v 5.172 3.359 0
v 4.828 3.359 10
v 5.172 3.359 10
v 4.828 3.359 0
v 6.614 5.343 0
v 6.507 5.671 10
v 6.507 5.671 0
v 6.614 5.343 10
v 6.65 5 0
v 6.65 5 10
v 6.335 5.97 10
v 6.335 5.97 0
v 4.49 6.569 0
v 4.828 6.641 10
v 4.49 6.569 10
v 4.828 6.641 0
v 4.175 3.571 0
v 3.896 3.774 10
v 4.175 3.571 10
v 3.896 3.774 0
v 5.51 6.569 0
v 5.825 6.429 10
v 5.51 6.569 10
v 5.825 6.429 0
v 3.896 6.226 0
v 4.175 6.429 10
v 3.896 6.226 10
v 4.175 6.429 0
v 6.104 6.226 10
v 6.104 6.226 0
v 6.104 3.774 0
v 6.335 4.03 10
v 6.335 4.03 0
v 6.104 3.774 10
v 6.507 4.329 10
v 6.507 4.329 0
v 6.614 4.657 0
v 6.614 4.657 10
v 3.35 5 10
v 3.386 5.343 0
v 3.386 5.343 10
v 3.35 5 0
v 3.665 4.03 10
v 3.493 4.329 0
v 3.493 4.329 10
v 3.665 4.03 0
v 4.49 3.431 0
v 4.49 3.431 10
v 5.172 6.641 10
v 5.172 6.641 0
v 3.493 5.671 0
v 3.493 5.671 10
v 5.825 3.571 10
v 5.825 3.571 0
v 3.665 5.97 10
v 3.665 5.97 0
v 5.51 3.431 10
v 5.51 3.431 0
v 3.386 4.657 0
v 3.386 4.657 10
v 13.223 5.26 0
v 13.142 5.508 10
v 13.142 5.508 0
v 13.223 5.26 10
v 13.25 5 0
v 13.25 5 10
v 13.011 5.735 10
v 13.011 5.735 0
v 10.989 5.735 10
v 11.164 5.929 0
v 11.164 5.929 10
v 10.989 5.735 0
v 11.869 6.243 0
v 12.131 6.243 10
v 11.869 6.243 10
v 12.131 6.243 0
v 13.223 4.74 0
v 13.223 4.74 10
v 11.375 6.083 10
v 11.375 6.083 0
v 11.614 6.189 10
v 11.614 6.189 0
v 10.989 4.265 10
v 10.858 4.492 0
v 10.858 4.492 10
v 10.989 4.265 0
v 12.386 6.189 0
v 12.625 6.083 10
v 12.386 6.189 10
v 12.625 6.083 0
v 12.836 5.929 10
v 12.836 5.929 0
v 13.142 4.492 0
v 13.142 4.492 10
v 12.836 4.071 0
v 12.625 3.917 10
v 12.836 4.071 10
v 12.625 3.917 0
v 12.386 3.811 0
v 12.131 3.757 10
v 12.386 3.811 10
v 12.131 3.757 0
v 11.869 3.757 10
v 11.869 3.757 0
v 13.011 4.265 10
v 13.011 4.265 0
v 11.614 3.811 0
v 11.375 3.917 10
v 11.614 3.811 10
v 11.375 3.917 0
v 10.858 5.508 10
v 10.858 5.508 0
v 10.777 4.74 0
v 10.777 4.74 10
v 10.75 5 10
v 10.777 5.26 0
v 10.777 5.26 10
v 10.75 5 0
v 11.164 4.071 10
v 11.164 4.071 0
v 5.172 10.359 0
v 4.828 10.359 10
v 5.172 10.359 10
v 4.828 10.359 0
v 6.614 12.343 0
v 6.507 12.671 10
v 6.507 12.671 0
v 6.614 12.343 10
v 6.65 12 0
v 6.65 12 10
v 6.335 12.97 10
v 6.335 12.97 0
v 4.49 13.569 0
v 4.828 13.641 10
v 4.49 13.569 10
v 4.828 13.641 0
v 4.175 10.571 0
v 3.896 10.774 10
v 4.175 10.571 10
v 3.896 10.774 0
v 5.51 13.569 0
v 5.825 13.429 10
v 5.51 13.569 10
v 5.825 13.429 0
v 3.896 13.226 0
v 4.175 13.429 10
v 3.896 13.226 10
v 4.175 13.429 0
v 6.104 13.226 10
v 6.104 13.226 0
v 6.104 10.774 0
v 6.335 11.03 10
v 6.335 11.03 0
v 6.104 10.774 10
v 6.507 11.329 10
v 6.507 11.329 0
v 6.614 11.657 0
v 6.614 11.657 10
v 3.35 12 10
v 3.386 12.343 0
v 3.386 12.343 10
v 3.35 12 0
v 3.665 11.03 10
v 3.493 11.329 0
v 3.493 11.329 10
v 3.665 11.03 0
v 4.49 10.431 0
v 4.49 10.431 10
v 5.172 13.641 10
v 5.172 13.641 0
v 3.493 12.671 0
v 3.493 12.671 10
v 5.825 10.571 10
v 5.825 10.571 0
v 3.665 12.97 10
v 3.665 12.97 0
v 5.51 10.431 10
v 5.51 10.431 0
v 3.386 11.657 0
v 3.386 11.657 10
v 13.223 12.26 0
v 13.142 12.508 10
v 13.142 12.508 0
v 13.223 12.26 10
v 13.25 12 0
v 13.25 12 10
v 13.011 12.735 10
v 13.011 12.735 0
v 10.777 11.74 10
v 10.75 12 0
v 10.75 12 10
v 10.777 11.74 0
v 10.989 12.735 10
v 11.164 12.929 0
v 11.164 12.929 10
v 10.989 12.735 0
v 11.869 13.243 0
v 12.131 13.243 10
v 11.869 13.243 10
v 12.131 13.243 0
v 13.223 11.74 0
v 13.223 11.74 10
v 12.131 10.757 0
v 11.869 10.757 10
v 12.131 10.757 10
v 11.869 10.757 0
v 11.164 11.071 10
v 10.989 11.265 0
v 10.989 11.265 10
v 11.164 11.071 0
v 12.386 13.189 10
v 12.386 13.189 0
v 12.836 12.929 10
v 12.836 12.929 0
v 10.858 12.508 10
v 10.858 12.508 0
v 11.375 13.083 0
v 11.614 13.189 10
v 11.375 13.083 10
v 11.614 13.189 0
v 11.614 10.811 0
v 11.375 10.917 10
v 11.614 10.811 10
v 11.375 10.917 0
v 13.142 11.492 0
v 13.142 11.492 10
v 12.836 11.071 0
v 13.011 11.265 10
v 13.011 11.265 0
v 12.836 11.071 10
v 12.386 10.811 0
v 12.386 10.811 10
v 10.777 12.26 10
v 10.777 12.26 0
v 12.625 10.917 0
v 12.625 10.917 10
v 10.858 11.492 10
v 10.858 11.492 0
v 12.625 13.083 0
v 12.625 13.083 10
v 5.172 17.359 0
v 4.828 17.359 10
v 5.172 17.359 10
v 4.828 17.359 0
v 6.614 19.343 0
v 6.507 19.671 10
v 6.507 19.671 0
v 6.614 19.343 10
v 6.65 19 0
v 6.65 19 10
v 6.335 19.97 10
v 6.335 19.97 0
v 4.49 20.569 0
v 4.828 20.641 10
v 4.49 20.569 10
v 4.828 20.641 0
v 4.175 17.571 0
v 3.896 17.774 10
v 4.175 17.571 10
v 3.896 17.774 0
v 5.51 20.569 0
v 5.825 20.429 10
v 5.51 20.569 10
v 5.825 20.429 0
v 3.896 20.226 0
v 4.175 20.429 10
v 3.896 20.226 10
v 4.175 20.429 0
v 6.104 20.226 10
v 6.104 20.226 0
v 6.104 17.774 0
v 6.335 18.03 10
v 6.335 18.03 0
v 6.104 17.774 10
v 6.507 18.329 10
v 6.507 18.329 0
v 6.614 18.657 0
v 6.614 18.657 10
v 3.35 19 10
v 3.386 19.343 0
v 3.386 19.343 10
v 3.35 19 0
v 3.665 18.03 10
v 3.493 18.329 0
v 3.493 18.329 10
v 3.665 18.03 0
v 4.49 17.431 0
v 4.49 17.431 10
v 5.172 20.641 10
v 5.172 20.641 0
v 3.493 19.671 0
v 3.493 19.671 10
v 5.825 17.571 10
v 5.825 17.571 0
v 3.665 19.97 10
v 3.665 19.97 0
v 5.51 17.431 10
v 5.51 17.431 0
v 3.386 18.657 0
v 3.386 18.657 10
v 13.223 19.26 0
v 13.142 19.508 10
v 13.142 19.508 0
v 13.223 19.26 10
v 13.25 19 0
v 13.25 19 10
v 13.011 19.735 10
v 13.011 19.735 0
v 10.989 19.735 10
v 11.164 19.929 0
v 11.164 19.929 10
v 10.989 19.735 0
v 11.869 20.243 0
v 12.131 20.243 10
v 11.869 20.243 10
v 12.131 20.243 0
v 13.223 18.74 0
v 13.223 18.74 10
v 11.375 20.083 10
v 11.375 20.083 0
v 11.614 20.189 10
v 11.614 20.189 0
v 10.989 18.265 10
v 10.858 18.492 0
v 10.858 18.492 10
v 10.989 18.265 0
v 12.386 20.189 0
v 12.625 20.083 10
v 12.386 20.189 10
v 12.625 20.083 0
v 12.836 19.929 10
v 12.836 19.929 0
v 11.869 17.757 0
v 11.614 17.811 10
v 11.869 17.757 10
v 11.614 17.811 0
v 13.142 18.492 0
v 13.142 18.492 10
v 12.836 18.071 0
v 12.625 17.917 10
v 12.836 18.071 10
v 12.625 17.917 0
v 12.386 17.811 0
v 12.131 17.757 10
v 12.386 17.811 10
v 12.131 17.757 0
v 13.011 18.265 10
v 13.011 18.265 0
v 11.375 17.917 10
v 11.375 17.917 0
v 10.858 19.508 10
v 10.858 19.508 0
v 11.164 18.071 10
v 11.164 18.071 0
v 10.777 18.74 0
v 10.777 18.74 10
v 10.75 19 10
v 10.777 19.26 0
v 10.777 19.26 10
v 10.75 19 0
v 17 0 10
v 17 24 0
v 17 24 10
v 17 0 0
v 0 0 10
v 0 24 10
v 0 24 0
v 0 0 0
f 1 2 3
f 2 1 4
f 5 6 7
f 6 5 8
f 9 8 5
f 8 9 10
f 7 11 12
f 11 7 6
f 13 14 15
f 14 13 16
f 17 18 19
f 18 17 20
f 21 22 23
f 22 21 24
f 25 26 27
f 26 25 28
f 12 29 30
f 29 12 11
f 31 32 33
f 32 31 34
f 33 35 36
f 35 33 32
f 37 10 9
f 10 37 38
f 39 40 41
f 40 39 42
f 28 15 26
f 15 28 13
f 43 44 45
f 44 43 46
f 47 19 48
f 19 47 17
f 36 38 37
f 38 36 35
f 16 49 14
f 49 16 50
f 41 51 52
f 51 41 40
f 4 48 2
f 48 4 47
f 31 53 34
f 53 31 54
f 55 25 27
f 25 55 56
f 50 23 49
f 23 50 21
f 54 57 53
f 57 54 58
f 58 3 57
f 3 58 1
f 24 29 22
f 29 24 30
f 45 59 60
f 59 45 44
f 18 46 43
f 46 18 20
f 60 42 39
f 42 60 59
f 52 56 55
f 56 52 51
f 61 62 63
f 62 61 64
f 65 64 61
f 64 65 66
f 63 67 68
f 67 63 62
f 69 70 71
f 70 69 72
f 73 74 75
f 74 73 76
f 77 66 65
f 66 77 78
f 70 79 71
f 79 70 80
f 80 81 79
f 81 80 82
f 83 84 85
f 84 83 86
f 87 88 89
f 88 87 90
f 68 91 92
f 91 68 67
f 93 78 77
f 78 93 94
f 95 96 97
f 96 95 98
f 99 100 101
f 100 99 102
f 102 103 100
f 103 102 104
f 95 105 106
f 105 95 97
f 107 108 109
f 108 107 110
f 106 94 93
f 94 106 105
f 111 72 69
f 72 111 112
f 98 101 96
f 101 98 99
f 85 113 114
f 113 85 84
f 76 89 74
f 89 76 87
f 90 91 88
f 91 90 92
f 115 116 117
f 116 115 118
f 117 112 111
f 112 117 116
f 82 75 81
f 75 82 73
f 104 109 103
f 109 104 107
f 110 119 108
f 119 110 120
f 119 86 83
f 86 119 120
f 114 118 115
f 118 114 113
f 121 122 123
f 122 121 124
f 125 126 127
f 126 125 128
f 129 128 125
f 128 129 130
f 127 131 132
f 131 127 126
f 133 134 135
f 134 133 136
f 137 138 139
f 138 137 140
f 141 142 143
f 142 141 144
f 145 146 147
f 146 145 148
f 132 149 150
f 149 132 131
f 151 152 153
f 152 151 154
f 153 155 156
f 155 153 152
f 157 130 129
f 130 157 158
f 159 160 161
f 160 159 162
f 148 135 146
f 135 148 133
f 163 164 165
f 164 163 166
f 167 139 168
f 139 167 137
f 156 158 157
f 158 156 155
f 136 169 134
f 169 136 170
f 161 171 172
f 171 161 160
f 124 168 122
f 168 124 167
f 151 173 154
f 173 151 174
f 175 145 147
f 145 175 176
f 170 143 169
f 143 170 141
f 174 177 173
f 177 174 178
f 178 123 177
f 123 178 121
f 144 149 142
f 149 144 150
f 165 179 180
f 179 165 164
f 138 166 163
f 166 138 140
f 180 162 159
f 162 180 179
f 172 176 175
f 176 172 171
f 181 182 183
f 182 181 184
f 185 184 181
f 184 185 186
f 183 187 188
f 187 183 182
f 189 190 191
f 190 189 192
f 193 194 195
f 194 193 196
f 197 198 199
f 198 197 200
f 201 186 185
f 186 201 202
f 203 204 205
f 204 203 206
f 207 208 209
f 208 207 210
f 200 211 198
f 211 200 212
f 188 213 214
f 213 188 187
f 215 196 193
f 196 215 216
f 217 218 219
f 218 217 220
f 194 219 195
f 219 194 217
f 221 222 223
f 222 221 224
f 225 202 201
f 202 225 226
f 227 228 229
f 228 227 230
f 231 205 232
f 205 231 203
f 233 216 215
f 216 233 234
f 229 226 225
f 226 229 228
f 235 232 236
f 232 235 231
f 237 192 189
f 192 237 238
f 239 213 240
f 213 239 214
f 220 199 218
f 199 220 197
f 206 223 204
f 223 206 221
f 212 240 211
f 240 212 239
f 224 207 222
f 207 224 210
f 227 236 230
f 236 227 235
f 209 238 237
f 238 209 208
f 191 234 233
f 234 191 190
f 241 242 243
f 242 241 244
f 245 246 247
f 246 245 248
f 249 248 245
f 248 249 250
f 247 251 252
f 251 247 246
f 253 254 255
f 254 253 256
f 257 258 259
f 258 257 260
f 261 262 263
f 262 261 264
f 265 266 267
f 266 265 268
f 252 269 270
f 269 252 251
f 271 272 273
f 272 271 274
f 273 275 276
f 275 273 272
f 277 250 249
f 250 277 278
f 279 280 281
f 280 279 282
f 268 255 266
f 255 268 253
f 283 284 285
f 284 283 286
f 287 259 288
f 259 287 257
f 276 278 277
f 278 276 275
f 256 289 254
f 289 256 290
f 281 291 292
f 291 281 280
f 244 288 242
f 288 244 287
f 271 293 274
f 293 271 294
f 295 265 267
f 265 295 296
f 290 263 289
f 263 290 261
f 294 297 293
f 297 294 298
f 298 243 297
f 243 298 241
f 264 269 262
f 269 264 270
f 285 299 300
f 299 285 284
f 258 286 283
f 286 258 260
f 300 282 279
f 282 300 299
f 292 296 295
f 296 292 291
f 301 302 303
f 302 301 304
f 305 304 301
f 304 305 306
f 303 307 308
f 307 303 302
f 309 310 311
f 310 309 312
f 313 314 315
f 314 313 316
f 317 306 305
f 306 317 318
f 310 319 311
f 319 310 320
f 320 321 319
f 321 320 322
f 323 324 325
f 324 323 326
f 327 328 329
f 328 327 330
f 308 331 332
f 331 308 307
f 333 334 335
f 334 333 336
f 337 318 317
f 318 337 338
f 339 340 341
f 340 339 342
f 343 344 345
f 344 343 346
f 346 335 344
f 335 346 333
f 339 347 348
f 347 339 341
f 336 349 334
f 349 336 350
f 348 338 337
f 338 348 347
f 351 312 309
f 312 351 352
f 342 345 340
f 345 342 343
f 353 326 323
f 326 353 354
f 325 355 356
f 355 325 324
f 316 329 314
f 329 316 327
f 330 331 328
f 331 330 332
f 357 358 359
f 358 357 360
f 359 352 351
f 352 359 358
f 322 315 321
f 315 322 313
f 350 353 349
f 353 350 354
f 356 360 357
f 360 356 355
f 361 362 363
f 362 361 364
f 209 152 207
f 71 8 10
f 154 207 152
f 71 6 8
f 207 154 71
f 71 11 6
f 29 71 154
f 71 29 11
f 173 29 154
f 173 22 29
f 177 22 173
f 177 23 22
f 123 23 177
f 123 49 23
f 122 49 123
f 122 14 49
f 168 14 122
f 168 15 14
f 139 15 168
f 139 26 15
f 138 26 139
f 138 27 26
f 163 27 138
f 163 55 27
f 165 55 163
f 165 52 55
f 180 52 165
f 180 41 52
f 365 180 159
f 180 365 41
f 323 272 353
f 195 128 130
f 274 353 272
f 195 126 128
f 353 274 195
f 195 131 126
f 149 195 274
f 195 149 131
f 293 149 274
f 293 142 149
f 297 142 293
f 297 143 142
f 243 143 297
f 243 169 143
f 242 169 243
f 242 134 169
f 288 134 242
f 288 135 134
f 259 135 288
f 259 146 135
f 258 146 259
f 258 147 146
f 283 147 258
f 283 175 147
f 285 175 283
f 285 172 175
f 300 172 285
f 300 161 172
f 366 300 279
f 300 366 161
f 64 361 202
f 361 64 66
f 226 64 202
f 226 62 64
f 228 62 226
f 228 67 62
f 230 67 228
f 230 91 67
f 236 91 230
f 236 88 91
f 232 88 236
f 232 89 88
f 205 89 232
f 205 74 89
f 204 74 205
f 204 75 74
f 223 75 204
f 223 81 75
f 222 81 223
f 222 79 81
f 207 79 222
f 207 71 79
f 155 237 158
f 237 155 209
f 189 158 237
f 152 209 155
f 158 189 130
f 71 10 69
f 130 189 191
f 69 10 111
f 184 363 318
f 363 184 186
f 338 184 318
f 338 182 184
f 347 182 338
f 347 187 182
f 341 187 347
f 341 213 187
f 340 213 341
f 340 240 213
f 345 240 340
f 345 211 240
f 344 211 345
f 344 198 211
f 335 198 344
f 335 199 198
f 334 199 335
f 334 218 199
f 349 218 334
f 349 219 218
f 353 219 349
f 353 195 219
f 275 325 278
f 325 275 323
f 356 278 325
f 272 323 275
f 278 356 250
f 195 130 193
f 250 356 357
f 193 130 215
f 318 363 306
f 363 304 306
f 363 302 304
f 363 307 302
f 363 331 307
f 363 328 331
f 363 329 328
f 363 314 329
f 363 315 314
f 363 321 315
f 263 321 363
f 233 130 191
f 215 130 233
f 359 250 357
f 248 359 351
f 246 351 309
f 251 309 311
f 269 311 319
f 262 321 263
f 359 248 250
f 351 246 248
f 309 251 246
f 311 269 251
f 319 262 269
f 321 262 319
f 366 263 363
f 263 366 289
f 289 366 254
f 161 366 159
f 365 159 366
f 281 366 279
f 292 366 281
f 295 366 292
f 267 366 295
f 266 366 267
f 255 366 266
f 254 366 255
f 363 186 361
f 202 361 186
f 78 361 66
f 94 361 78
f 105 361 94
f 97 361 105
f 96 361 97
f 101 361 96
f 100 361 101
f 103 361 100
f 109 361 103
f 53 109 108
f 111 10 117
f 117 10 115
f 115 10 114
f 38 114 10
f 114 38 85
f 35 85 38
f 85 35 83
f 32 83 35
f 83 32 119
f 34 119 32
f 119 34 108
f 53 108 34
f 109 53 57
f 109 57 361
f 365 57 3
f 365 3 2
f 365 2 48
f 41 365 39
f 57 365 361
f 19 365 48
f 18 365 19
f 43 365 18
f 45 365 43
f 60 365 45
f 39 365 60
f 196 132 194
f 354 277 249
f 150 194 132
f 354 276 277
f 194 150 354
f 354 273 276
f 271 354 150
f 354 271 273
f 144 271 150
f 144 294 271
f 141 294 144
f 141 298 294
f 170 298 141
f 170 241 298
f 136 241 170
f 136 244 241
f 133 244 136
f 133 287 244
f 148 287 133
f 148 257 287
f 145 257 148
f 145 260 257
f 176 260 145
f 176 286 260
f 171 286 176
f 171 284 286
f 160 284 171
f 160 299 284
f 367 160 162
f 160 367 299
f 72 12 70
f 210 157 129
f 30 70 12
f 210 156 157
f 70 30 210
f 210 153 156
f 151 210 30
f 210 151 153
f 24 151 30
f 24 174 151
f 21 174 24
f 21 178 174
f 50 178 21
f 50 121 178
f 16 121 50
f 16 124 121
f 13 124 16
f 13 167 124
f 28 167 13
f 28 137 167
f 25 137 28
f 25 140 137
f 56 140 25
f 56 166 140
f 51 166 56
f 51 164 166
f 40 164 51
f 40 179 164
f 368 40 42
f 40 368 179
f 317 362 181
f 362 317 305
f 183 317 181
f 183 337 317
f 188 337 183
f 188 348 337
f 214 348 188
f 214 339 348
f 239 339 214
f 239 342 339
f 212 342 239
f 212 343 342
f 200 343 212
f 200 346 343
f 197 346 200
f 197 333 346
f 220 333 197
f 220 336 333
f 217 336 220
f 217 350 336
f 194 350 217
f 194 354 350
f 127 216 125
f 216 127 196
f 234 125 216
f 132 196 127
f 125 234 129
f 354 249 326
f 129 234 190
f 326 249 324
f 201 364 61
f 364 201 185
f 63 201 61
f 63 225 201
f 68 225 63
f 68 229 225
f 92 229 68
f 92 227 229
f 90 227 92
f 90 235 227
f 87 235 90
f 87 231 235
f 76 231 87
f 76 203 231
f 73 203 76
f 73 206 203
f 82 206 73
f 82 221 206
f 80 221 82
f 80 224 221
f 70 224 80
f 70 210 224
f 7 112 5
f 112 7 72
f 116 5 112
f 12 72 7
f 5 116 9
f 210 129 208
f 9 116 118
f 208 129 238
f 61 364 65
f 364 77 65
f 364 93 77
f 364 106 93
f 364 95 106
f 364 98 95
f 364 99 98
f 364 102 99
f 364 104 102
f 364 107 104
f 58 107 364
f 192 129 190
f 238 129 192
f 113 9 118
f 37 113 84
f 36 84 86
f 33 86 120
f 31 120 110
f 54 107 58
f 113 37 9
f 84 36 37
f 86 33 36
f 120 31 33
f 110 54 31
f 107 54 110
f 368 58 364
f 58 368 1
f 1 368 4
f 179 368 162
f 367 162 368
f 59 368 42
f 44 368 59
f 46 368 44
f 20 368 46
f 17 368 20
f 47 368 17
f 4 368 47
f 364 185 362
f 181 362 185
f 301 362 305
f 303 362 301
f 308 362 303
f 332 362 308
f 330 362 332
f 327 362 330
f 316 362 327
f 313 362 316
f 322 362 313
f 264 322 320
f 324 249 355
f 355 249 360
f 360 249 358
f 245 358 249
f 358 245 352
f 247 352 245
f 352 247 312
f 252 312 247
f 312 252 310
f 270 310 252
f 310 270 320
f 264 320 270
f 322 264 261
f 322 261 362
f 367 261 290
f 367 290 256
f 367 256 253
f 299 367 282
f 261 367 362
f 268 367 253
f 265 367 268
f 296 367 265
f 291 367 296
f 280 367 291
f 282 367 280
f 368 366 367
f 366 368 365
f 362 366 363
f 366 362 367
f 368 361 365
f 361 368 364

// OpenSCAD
// created by IndiePandaaaaa | Lukas

// https://de.wikipedia.org/wiki/Kernloch
//  Gewinde	Steigung	Kernloch
//  M12     x1.75	10.2
//  M10	    x1.5	8.5
//  M8	    x1.25	6.8
//  M6	    x1	    5.0
//  M5	    x0.8	4.2
//  M4	    x0.7	3.3
//  M3	    x0.5	2.5

difference() {
    cube([17, 24, 10]);
    for (i = [0:2]) {
        translate([5, 5 + 7 * i, - 2]) {
            cylinder(15, d = 3.3, $fs = 0.1);
            translate([7, 0, 0])
                cylinder(15, d = 2.5, $fs = 0.1);
        }
    }
}
